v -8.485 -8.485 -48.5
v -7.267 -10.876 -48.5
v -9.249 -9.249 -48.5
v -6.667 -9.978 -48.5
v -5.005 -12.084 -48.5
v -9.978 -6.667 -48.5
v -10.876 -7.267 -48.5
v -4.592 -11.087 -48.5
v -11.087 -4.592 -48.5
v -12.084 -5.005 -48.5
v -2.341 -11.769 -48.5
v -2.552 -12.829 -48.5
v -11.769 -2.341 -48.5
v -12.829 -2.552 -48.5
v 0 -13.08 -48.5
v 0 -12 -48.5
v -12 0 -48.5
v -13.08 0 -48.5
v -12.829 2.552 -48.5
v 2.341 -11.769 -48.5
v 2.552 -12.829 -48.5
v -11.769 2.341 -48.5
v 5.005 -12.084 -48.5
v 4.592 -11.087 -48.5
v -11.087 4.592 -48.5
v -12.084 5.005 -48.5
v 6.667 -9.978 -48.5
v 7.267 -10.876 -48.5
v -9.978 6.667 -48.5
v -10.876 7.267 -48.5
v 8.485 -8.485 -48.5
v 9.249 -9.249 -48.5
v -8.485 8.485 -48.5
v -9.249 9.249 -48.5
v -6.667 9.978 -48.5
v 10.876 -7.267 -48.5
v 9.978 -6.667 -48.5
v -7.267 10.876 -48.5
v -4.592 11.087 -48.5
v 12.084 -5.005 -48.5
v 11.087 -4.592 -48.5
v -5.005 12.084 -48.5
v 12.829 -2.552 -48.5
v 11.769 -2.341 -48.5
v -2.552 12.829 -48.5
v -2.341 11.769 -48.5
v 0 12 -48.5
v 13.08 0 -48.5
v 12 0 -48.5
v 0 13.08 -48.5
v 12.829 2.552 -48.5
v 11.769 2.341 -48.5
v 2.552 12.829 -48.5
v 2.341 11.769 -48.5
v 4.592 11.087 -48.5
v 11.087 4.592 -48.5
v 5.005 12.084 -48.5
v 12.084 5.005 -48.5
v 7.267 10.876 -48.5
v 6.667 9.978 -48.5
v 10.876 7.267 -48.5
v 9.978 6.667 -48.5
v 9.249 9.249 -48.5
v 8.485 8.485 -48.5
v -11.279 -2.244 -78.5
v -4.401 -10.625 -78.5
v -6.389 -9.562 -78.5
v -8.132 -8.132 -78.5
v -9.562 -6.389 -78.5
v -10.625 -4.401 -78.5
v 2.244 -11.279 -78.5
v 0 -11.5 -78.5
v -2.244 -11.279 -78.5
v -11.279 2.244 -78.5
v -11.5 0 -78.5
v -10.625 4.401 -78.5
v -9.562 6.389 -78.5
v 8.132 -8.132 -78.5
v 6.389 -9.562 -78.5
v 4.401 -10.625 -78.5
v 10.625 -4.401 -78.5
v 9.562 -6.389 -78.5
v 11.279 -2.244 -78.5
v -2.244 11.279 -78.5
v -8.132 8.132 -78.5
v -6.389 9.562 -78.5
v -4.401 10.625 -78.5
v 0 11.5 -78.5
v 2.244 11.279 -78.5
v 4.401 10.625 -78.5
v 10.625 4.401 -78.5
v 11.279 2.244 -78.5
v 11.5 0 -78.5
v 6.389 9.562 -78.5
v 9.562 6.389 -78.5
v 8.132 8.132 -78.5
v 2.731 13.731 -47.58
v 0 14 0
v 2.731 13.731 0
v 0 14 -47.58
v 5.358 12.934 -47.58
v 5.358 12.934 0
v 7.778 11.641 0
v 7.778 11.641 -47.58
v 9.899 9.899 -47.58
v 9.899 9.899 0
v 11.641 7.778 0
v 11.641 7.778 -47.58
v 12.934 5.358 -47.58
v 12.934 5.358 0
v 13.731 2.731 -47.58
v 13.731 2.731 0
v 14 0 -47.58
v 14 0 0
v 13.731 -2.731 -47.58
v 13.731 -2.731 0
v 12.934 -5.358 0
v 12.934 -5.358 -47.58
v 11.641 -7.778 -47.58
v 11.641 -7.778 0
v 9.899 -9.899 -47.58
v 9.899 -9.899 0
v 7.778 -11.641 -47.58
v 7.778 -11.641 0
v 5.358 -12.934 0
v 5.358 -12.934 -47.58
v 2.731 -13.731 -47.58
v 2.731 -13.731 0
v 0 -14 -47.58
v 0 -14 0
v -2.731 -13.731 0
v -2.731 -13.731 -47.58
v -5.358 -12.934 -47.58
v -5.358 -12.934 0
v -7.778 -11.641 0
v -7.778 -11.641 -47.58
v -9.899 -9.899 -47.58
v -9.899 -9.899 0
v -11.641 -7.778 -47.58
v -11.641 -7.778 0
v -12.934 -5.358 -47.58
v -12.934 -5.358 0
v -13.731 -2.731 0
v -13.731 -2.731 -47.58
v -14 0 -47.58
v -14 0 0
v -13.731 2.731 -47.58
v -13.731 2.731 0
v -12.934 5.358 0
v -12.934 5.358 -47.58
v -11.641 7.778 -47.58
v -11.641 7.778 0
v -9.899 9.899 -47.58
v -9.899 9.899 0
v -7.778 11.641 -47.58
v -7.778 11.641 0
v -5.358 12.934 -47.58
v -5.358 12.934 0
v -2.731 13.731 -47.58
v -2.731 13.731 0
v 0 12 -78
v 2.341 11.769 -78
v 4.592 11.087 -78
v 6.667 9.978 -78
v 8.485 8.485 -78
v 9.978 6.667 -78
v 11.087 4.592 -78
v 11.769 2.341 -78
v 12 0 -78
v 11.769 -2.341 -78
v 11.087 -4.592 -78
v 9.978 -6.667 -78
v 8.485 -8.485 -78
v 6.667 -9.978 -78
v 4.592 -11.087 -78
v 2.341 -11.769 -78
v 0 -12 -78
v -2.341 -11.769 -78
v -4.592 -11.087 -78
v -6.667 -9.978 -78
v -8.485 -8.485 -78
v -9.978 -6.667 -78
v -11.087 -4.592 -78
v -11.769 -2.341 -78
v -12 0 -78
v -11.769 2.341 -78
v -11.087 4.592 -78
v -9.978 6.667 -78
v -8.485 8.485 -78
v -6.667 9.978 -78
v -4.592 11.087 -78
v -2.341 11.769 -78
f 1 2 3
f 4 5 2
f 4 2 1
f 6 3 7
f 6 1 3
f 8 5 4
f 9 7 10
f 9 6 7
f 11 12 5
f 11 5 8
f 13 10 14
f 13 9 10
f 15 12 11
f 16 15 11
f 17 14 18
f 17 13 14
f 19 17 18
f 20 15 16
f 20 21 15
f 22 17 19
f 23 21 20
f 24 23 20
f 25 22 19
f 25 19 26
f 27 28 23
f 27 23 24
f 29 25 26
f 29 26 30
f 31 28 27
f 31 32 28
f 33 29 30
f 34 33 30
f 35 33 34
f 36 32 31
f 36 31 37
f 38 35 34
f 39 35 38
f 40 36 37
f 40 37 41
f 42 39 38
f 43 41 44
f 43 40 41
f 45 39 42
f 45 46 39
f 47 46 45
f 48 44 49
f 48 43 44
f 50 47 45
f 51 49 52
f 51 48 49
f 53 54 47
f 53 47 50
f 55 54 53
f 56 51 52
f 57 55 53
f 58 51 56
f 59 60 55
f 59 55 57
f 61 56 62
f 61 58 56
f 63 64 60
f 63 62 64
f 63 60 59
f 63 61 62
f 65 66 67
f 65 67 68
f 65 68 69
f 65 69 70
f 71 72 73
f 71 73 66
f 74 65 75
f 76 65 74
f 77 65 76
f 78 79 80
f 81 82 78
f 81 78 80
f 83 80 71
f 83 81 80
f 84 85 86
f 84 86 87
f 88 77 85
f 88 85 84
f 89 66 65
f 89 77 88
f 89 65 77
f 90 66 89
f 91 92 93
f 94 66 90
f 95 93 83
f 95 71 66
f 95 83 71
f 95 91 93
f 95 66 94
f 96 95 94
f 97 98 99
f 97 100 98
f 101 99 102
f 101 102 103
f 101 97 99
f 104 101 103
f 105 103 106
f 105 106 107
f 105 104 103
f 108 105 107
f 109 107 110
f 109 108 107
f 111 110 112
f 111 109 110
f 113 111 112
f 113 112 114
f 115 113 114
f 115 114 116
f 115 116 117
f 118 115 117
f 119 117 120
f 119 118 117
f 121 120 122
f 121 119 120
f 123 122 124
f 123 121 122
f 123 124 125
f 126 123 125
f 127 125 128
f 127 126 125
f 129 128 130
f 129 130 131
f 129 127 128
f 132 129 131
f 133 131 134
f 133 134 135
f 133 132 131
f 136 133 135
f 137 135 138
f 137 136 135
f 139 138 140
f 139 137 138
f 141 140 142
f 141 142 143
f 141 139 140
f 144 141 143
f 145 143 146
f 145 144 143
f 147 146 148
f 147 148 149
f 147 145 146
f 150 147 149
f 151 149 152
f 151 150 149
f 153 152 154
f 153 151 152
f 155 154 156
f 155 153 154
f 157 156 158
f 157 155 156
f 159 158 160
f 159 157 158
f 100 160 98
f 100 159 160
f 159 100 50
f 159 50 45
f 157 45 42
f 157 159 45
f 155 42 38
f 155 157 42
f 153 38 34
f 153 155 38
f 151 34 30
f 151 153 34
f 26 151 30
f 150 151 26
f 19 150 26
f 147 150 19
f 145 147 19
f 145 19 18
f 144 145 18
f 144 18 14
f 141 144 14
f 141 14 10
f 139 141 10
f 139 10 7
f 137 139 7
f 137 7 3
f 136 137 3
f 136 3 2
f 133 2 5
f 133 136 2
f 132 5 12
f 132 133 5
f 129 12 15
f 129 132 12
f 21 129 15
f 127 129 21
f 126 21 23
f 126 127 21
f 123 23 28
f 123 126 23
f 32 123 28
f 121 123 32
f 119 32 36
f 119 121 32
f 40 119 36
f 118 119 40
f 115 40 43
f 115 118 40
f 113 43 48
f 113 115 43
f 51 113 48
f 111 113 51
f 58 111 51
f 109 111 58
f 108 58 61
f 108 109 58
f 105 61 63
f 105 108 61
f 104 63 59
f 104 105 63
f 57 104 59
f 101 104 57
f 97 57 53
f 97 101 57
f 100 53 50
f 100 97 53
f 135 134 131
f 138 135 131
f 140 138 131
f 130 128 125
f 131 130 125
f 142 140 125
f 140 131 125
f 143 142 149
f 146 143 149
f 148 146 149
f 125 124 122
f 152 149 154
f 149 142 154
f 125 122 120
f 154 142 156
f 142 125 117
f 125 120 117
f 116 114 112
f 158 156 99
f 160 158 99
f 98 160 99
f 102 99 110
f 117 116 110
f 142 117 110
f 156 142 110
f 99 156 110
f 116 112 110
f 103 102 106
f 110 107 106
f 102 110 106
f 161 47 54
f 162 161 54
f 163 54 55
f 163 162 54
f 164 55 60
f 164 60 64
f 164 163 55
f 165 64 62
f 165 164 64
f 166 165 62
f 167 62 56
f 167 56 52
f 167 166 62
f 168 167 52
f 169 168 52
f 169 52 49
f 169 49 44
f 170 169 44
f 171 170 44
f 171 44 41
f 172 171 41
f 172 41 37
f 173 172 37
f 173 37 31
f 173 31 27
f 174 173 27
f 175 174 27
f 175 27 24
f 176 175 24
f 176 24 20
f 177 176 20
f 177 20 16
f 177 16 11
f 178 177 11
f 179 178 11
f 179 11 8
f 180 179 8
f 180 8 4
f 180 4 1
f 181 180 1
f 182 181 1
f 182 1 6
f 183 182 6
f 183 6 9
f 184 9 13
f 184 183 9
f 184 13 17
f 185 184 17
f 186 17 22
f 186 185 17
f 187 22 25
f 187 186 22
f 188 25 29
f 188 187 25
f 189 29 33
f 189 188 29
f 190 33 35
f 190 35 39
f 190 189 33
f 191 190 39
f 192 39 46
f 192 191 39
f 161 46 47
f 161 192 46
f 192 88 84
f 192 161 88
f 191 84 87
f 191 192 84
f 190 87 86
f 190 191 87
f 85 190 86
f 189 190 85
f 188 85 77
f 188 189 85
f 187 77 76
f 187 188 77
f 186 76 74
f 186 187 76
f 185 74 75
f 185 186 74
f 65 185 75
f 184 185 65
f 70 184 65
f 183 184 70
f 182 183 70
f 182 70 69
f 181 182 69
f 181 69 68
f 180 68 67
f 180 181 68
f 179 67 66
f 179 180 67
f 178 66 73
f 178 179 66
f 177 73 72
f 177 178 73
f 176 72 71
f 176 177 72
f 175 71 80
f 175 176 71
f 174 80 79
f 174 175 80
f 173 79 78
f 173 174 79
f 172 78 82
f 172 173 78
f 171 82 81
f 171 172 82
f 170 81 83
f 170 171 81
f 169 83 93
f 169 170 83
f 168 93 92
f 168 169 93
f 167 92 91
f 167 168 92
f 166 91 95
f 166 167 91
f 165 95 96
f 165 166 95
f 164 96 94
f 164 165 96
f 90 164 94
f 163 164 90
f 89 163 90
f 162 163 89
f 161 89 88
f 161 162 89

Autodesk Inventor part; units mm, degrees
sketch "Sketch_1" plane through (0, 0, 0) normal (1, 0, 0) x (0, 1, 0)
  line L0 (0, -78.5) -> (0, 0)
  line L1 (0, 0) -> (14, 0)
  line L2 (14, 0) -> (14, -47.58)
  line L3 (14, -47.58) -> (13.08, -48.5)
  line L4 (13.08, -48.5) -> (12, -48.5)
  line L5 (12, -48.5) -> (12, -78)
  line L6 (12, -78) -> (11.5, -78.5)
  line L7 (11.5, -78.5) -> (0, -78.5)
  line L8 (0, -78.5) -> (0, 0)
revolve "Revolution1" add sketch "Sketch_1" angle 360 about axis through (0, 0, -78.5) along (0, 0, -1)
thread "Thread1" size "M28x1.5" class "6g" standard "ISO Metric profile" length 27.08
ref_plane "ANBAU_XY" through (0, 0, 0) normal (0, 0, 1) x (1, 0, 0)
ref_plane "ANBAU_YZ" through (0, 0, 0) normal (1, 0, 0) x (0, 1, 0)
ref_plane "ANBAU_ZX" through (0, 0, 0) normal (0, 1, 0) x (0, 0, 1)
properties part number "ESBF-BS-100-ESBF-BS-100---(KSA)"
